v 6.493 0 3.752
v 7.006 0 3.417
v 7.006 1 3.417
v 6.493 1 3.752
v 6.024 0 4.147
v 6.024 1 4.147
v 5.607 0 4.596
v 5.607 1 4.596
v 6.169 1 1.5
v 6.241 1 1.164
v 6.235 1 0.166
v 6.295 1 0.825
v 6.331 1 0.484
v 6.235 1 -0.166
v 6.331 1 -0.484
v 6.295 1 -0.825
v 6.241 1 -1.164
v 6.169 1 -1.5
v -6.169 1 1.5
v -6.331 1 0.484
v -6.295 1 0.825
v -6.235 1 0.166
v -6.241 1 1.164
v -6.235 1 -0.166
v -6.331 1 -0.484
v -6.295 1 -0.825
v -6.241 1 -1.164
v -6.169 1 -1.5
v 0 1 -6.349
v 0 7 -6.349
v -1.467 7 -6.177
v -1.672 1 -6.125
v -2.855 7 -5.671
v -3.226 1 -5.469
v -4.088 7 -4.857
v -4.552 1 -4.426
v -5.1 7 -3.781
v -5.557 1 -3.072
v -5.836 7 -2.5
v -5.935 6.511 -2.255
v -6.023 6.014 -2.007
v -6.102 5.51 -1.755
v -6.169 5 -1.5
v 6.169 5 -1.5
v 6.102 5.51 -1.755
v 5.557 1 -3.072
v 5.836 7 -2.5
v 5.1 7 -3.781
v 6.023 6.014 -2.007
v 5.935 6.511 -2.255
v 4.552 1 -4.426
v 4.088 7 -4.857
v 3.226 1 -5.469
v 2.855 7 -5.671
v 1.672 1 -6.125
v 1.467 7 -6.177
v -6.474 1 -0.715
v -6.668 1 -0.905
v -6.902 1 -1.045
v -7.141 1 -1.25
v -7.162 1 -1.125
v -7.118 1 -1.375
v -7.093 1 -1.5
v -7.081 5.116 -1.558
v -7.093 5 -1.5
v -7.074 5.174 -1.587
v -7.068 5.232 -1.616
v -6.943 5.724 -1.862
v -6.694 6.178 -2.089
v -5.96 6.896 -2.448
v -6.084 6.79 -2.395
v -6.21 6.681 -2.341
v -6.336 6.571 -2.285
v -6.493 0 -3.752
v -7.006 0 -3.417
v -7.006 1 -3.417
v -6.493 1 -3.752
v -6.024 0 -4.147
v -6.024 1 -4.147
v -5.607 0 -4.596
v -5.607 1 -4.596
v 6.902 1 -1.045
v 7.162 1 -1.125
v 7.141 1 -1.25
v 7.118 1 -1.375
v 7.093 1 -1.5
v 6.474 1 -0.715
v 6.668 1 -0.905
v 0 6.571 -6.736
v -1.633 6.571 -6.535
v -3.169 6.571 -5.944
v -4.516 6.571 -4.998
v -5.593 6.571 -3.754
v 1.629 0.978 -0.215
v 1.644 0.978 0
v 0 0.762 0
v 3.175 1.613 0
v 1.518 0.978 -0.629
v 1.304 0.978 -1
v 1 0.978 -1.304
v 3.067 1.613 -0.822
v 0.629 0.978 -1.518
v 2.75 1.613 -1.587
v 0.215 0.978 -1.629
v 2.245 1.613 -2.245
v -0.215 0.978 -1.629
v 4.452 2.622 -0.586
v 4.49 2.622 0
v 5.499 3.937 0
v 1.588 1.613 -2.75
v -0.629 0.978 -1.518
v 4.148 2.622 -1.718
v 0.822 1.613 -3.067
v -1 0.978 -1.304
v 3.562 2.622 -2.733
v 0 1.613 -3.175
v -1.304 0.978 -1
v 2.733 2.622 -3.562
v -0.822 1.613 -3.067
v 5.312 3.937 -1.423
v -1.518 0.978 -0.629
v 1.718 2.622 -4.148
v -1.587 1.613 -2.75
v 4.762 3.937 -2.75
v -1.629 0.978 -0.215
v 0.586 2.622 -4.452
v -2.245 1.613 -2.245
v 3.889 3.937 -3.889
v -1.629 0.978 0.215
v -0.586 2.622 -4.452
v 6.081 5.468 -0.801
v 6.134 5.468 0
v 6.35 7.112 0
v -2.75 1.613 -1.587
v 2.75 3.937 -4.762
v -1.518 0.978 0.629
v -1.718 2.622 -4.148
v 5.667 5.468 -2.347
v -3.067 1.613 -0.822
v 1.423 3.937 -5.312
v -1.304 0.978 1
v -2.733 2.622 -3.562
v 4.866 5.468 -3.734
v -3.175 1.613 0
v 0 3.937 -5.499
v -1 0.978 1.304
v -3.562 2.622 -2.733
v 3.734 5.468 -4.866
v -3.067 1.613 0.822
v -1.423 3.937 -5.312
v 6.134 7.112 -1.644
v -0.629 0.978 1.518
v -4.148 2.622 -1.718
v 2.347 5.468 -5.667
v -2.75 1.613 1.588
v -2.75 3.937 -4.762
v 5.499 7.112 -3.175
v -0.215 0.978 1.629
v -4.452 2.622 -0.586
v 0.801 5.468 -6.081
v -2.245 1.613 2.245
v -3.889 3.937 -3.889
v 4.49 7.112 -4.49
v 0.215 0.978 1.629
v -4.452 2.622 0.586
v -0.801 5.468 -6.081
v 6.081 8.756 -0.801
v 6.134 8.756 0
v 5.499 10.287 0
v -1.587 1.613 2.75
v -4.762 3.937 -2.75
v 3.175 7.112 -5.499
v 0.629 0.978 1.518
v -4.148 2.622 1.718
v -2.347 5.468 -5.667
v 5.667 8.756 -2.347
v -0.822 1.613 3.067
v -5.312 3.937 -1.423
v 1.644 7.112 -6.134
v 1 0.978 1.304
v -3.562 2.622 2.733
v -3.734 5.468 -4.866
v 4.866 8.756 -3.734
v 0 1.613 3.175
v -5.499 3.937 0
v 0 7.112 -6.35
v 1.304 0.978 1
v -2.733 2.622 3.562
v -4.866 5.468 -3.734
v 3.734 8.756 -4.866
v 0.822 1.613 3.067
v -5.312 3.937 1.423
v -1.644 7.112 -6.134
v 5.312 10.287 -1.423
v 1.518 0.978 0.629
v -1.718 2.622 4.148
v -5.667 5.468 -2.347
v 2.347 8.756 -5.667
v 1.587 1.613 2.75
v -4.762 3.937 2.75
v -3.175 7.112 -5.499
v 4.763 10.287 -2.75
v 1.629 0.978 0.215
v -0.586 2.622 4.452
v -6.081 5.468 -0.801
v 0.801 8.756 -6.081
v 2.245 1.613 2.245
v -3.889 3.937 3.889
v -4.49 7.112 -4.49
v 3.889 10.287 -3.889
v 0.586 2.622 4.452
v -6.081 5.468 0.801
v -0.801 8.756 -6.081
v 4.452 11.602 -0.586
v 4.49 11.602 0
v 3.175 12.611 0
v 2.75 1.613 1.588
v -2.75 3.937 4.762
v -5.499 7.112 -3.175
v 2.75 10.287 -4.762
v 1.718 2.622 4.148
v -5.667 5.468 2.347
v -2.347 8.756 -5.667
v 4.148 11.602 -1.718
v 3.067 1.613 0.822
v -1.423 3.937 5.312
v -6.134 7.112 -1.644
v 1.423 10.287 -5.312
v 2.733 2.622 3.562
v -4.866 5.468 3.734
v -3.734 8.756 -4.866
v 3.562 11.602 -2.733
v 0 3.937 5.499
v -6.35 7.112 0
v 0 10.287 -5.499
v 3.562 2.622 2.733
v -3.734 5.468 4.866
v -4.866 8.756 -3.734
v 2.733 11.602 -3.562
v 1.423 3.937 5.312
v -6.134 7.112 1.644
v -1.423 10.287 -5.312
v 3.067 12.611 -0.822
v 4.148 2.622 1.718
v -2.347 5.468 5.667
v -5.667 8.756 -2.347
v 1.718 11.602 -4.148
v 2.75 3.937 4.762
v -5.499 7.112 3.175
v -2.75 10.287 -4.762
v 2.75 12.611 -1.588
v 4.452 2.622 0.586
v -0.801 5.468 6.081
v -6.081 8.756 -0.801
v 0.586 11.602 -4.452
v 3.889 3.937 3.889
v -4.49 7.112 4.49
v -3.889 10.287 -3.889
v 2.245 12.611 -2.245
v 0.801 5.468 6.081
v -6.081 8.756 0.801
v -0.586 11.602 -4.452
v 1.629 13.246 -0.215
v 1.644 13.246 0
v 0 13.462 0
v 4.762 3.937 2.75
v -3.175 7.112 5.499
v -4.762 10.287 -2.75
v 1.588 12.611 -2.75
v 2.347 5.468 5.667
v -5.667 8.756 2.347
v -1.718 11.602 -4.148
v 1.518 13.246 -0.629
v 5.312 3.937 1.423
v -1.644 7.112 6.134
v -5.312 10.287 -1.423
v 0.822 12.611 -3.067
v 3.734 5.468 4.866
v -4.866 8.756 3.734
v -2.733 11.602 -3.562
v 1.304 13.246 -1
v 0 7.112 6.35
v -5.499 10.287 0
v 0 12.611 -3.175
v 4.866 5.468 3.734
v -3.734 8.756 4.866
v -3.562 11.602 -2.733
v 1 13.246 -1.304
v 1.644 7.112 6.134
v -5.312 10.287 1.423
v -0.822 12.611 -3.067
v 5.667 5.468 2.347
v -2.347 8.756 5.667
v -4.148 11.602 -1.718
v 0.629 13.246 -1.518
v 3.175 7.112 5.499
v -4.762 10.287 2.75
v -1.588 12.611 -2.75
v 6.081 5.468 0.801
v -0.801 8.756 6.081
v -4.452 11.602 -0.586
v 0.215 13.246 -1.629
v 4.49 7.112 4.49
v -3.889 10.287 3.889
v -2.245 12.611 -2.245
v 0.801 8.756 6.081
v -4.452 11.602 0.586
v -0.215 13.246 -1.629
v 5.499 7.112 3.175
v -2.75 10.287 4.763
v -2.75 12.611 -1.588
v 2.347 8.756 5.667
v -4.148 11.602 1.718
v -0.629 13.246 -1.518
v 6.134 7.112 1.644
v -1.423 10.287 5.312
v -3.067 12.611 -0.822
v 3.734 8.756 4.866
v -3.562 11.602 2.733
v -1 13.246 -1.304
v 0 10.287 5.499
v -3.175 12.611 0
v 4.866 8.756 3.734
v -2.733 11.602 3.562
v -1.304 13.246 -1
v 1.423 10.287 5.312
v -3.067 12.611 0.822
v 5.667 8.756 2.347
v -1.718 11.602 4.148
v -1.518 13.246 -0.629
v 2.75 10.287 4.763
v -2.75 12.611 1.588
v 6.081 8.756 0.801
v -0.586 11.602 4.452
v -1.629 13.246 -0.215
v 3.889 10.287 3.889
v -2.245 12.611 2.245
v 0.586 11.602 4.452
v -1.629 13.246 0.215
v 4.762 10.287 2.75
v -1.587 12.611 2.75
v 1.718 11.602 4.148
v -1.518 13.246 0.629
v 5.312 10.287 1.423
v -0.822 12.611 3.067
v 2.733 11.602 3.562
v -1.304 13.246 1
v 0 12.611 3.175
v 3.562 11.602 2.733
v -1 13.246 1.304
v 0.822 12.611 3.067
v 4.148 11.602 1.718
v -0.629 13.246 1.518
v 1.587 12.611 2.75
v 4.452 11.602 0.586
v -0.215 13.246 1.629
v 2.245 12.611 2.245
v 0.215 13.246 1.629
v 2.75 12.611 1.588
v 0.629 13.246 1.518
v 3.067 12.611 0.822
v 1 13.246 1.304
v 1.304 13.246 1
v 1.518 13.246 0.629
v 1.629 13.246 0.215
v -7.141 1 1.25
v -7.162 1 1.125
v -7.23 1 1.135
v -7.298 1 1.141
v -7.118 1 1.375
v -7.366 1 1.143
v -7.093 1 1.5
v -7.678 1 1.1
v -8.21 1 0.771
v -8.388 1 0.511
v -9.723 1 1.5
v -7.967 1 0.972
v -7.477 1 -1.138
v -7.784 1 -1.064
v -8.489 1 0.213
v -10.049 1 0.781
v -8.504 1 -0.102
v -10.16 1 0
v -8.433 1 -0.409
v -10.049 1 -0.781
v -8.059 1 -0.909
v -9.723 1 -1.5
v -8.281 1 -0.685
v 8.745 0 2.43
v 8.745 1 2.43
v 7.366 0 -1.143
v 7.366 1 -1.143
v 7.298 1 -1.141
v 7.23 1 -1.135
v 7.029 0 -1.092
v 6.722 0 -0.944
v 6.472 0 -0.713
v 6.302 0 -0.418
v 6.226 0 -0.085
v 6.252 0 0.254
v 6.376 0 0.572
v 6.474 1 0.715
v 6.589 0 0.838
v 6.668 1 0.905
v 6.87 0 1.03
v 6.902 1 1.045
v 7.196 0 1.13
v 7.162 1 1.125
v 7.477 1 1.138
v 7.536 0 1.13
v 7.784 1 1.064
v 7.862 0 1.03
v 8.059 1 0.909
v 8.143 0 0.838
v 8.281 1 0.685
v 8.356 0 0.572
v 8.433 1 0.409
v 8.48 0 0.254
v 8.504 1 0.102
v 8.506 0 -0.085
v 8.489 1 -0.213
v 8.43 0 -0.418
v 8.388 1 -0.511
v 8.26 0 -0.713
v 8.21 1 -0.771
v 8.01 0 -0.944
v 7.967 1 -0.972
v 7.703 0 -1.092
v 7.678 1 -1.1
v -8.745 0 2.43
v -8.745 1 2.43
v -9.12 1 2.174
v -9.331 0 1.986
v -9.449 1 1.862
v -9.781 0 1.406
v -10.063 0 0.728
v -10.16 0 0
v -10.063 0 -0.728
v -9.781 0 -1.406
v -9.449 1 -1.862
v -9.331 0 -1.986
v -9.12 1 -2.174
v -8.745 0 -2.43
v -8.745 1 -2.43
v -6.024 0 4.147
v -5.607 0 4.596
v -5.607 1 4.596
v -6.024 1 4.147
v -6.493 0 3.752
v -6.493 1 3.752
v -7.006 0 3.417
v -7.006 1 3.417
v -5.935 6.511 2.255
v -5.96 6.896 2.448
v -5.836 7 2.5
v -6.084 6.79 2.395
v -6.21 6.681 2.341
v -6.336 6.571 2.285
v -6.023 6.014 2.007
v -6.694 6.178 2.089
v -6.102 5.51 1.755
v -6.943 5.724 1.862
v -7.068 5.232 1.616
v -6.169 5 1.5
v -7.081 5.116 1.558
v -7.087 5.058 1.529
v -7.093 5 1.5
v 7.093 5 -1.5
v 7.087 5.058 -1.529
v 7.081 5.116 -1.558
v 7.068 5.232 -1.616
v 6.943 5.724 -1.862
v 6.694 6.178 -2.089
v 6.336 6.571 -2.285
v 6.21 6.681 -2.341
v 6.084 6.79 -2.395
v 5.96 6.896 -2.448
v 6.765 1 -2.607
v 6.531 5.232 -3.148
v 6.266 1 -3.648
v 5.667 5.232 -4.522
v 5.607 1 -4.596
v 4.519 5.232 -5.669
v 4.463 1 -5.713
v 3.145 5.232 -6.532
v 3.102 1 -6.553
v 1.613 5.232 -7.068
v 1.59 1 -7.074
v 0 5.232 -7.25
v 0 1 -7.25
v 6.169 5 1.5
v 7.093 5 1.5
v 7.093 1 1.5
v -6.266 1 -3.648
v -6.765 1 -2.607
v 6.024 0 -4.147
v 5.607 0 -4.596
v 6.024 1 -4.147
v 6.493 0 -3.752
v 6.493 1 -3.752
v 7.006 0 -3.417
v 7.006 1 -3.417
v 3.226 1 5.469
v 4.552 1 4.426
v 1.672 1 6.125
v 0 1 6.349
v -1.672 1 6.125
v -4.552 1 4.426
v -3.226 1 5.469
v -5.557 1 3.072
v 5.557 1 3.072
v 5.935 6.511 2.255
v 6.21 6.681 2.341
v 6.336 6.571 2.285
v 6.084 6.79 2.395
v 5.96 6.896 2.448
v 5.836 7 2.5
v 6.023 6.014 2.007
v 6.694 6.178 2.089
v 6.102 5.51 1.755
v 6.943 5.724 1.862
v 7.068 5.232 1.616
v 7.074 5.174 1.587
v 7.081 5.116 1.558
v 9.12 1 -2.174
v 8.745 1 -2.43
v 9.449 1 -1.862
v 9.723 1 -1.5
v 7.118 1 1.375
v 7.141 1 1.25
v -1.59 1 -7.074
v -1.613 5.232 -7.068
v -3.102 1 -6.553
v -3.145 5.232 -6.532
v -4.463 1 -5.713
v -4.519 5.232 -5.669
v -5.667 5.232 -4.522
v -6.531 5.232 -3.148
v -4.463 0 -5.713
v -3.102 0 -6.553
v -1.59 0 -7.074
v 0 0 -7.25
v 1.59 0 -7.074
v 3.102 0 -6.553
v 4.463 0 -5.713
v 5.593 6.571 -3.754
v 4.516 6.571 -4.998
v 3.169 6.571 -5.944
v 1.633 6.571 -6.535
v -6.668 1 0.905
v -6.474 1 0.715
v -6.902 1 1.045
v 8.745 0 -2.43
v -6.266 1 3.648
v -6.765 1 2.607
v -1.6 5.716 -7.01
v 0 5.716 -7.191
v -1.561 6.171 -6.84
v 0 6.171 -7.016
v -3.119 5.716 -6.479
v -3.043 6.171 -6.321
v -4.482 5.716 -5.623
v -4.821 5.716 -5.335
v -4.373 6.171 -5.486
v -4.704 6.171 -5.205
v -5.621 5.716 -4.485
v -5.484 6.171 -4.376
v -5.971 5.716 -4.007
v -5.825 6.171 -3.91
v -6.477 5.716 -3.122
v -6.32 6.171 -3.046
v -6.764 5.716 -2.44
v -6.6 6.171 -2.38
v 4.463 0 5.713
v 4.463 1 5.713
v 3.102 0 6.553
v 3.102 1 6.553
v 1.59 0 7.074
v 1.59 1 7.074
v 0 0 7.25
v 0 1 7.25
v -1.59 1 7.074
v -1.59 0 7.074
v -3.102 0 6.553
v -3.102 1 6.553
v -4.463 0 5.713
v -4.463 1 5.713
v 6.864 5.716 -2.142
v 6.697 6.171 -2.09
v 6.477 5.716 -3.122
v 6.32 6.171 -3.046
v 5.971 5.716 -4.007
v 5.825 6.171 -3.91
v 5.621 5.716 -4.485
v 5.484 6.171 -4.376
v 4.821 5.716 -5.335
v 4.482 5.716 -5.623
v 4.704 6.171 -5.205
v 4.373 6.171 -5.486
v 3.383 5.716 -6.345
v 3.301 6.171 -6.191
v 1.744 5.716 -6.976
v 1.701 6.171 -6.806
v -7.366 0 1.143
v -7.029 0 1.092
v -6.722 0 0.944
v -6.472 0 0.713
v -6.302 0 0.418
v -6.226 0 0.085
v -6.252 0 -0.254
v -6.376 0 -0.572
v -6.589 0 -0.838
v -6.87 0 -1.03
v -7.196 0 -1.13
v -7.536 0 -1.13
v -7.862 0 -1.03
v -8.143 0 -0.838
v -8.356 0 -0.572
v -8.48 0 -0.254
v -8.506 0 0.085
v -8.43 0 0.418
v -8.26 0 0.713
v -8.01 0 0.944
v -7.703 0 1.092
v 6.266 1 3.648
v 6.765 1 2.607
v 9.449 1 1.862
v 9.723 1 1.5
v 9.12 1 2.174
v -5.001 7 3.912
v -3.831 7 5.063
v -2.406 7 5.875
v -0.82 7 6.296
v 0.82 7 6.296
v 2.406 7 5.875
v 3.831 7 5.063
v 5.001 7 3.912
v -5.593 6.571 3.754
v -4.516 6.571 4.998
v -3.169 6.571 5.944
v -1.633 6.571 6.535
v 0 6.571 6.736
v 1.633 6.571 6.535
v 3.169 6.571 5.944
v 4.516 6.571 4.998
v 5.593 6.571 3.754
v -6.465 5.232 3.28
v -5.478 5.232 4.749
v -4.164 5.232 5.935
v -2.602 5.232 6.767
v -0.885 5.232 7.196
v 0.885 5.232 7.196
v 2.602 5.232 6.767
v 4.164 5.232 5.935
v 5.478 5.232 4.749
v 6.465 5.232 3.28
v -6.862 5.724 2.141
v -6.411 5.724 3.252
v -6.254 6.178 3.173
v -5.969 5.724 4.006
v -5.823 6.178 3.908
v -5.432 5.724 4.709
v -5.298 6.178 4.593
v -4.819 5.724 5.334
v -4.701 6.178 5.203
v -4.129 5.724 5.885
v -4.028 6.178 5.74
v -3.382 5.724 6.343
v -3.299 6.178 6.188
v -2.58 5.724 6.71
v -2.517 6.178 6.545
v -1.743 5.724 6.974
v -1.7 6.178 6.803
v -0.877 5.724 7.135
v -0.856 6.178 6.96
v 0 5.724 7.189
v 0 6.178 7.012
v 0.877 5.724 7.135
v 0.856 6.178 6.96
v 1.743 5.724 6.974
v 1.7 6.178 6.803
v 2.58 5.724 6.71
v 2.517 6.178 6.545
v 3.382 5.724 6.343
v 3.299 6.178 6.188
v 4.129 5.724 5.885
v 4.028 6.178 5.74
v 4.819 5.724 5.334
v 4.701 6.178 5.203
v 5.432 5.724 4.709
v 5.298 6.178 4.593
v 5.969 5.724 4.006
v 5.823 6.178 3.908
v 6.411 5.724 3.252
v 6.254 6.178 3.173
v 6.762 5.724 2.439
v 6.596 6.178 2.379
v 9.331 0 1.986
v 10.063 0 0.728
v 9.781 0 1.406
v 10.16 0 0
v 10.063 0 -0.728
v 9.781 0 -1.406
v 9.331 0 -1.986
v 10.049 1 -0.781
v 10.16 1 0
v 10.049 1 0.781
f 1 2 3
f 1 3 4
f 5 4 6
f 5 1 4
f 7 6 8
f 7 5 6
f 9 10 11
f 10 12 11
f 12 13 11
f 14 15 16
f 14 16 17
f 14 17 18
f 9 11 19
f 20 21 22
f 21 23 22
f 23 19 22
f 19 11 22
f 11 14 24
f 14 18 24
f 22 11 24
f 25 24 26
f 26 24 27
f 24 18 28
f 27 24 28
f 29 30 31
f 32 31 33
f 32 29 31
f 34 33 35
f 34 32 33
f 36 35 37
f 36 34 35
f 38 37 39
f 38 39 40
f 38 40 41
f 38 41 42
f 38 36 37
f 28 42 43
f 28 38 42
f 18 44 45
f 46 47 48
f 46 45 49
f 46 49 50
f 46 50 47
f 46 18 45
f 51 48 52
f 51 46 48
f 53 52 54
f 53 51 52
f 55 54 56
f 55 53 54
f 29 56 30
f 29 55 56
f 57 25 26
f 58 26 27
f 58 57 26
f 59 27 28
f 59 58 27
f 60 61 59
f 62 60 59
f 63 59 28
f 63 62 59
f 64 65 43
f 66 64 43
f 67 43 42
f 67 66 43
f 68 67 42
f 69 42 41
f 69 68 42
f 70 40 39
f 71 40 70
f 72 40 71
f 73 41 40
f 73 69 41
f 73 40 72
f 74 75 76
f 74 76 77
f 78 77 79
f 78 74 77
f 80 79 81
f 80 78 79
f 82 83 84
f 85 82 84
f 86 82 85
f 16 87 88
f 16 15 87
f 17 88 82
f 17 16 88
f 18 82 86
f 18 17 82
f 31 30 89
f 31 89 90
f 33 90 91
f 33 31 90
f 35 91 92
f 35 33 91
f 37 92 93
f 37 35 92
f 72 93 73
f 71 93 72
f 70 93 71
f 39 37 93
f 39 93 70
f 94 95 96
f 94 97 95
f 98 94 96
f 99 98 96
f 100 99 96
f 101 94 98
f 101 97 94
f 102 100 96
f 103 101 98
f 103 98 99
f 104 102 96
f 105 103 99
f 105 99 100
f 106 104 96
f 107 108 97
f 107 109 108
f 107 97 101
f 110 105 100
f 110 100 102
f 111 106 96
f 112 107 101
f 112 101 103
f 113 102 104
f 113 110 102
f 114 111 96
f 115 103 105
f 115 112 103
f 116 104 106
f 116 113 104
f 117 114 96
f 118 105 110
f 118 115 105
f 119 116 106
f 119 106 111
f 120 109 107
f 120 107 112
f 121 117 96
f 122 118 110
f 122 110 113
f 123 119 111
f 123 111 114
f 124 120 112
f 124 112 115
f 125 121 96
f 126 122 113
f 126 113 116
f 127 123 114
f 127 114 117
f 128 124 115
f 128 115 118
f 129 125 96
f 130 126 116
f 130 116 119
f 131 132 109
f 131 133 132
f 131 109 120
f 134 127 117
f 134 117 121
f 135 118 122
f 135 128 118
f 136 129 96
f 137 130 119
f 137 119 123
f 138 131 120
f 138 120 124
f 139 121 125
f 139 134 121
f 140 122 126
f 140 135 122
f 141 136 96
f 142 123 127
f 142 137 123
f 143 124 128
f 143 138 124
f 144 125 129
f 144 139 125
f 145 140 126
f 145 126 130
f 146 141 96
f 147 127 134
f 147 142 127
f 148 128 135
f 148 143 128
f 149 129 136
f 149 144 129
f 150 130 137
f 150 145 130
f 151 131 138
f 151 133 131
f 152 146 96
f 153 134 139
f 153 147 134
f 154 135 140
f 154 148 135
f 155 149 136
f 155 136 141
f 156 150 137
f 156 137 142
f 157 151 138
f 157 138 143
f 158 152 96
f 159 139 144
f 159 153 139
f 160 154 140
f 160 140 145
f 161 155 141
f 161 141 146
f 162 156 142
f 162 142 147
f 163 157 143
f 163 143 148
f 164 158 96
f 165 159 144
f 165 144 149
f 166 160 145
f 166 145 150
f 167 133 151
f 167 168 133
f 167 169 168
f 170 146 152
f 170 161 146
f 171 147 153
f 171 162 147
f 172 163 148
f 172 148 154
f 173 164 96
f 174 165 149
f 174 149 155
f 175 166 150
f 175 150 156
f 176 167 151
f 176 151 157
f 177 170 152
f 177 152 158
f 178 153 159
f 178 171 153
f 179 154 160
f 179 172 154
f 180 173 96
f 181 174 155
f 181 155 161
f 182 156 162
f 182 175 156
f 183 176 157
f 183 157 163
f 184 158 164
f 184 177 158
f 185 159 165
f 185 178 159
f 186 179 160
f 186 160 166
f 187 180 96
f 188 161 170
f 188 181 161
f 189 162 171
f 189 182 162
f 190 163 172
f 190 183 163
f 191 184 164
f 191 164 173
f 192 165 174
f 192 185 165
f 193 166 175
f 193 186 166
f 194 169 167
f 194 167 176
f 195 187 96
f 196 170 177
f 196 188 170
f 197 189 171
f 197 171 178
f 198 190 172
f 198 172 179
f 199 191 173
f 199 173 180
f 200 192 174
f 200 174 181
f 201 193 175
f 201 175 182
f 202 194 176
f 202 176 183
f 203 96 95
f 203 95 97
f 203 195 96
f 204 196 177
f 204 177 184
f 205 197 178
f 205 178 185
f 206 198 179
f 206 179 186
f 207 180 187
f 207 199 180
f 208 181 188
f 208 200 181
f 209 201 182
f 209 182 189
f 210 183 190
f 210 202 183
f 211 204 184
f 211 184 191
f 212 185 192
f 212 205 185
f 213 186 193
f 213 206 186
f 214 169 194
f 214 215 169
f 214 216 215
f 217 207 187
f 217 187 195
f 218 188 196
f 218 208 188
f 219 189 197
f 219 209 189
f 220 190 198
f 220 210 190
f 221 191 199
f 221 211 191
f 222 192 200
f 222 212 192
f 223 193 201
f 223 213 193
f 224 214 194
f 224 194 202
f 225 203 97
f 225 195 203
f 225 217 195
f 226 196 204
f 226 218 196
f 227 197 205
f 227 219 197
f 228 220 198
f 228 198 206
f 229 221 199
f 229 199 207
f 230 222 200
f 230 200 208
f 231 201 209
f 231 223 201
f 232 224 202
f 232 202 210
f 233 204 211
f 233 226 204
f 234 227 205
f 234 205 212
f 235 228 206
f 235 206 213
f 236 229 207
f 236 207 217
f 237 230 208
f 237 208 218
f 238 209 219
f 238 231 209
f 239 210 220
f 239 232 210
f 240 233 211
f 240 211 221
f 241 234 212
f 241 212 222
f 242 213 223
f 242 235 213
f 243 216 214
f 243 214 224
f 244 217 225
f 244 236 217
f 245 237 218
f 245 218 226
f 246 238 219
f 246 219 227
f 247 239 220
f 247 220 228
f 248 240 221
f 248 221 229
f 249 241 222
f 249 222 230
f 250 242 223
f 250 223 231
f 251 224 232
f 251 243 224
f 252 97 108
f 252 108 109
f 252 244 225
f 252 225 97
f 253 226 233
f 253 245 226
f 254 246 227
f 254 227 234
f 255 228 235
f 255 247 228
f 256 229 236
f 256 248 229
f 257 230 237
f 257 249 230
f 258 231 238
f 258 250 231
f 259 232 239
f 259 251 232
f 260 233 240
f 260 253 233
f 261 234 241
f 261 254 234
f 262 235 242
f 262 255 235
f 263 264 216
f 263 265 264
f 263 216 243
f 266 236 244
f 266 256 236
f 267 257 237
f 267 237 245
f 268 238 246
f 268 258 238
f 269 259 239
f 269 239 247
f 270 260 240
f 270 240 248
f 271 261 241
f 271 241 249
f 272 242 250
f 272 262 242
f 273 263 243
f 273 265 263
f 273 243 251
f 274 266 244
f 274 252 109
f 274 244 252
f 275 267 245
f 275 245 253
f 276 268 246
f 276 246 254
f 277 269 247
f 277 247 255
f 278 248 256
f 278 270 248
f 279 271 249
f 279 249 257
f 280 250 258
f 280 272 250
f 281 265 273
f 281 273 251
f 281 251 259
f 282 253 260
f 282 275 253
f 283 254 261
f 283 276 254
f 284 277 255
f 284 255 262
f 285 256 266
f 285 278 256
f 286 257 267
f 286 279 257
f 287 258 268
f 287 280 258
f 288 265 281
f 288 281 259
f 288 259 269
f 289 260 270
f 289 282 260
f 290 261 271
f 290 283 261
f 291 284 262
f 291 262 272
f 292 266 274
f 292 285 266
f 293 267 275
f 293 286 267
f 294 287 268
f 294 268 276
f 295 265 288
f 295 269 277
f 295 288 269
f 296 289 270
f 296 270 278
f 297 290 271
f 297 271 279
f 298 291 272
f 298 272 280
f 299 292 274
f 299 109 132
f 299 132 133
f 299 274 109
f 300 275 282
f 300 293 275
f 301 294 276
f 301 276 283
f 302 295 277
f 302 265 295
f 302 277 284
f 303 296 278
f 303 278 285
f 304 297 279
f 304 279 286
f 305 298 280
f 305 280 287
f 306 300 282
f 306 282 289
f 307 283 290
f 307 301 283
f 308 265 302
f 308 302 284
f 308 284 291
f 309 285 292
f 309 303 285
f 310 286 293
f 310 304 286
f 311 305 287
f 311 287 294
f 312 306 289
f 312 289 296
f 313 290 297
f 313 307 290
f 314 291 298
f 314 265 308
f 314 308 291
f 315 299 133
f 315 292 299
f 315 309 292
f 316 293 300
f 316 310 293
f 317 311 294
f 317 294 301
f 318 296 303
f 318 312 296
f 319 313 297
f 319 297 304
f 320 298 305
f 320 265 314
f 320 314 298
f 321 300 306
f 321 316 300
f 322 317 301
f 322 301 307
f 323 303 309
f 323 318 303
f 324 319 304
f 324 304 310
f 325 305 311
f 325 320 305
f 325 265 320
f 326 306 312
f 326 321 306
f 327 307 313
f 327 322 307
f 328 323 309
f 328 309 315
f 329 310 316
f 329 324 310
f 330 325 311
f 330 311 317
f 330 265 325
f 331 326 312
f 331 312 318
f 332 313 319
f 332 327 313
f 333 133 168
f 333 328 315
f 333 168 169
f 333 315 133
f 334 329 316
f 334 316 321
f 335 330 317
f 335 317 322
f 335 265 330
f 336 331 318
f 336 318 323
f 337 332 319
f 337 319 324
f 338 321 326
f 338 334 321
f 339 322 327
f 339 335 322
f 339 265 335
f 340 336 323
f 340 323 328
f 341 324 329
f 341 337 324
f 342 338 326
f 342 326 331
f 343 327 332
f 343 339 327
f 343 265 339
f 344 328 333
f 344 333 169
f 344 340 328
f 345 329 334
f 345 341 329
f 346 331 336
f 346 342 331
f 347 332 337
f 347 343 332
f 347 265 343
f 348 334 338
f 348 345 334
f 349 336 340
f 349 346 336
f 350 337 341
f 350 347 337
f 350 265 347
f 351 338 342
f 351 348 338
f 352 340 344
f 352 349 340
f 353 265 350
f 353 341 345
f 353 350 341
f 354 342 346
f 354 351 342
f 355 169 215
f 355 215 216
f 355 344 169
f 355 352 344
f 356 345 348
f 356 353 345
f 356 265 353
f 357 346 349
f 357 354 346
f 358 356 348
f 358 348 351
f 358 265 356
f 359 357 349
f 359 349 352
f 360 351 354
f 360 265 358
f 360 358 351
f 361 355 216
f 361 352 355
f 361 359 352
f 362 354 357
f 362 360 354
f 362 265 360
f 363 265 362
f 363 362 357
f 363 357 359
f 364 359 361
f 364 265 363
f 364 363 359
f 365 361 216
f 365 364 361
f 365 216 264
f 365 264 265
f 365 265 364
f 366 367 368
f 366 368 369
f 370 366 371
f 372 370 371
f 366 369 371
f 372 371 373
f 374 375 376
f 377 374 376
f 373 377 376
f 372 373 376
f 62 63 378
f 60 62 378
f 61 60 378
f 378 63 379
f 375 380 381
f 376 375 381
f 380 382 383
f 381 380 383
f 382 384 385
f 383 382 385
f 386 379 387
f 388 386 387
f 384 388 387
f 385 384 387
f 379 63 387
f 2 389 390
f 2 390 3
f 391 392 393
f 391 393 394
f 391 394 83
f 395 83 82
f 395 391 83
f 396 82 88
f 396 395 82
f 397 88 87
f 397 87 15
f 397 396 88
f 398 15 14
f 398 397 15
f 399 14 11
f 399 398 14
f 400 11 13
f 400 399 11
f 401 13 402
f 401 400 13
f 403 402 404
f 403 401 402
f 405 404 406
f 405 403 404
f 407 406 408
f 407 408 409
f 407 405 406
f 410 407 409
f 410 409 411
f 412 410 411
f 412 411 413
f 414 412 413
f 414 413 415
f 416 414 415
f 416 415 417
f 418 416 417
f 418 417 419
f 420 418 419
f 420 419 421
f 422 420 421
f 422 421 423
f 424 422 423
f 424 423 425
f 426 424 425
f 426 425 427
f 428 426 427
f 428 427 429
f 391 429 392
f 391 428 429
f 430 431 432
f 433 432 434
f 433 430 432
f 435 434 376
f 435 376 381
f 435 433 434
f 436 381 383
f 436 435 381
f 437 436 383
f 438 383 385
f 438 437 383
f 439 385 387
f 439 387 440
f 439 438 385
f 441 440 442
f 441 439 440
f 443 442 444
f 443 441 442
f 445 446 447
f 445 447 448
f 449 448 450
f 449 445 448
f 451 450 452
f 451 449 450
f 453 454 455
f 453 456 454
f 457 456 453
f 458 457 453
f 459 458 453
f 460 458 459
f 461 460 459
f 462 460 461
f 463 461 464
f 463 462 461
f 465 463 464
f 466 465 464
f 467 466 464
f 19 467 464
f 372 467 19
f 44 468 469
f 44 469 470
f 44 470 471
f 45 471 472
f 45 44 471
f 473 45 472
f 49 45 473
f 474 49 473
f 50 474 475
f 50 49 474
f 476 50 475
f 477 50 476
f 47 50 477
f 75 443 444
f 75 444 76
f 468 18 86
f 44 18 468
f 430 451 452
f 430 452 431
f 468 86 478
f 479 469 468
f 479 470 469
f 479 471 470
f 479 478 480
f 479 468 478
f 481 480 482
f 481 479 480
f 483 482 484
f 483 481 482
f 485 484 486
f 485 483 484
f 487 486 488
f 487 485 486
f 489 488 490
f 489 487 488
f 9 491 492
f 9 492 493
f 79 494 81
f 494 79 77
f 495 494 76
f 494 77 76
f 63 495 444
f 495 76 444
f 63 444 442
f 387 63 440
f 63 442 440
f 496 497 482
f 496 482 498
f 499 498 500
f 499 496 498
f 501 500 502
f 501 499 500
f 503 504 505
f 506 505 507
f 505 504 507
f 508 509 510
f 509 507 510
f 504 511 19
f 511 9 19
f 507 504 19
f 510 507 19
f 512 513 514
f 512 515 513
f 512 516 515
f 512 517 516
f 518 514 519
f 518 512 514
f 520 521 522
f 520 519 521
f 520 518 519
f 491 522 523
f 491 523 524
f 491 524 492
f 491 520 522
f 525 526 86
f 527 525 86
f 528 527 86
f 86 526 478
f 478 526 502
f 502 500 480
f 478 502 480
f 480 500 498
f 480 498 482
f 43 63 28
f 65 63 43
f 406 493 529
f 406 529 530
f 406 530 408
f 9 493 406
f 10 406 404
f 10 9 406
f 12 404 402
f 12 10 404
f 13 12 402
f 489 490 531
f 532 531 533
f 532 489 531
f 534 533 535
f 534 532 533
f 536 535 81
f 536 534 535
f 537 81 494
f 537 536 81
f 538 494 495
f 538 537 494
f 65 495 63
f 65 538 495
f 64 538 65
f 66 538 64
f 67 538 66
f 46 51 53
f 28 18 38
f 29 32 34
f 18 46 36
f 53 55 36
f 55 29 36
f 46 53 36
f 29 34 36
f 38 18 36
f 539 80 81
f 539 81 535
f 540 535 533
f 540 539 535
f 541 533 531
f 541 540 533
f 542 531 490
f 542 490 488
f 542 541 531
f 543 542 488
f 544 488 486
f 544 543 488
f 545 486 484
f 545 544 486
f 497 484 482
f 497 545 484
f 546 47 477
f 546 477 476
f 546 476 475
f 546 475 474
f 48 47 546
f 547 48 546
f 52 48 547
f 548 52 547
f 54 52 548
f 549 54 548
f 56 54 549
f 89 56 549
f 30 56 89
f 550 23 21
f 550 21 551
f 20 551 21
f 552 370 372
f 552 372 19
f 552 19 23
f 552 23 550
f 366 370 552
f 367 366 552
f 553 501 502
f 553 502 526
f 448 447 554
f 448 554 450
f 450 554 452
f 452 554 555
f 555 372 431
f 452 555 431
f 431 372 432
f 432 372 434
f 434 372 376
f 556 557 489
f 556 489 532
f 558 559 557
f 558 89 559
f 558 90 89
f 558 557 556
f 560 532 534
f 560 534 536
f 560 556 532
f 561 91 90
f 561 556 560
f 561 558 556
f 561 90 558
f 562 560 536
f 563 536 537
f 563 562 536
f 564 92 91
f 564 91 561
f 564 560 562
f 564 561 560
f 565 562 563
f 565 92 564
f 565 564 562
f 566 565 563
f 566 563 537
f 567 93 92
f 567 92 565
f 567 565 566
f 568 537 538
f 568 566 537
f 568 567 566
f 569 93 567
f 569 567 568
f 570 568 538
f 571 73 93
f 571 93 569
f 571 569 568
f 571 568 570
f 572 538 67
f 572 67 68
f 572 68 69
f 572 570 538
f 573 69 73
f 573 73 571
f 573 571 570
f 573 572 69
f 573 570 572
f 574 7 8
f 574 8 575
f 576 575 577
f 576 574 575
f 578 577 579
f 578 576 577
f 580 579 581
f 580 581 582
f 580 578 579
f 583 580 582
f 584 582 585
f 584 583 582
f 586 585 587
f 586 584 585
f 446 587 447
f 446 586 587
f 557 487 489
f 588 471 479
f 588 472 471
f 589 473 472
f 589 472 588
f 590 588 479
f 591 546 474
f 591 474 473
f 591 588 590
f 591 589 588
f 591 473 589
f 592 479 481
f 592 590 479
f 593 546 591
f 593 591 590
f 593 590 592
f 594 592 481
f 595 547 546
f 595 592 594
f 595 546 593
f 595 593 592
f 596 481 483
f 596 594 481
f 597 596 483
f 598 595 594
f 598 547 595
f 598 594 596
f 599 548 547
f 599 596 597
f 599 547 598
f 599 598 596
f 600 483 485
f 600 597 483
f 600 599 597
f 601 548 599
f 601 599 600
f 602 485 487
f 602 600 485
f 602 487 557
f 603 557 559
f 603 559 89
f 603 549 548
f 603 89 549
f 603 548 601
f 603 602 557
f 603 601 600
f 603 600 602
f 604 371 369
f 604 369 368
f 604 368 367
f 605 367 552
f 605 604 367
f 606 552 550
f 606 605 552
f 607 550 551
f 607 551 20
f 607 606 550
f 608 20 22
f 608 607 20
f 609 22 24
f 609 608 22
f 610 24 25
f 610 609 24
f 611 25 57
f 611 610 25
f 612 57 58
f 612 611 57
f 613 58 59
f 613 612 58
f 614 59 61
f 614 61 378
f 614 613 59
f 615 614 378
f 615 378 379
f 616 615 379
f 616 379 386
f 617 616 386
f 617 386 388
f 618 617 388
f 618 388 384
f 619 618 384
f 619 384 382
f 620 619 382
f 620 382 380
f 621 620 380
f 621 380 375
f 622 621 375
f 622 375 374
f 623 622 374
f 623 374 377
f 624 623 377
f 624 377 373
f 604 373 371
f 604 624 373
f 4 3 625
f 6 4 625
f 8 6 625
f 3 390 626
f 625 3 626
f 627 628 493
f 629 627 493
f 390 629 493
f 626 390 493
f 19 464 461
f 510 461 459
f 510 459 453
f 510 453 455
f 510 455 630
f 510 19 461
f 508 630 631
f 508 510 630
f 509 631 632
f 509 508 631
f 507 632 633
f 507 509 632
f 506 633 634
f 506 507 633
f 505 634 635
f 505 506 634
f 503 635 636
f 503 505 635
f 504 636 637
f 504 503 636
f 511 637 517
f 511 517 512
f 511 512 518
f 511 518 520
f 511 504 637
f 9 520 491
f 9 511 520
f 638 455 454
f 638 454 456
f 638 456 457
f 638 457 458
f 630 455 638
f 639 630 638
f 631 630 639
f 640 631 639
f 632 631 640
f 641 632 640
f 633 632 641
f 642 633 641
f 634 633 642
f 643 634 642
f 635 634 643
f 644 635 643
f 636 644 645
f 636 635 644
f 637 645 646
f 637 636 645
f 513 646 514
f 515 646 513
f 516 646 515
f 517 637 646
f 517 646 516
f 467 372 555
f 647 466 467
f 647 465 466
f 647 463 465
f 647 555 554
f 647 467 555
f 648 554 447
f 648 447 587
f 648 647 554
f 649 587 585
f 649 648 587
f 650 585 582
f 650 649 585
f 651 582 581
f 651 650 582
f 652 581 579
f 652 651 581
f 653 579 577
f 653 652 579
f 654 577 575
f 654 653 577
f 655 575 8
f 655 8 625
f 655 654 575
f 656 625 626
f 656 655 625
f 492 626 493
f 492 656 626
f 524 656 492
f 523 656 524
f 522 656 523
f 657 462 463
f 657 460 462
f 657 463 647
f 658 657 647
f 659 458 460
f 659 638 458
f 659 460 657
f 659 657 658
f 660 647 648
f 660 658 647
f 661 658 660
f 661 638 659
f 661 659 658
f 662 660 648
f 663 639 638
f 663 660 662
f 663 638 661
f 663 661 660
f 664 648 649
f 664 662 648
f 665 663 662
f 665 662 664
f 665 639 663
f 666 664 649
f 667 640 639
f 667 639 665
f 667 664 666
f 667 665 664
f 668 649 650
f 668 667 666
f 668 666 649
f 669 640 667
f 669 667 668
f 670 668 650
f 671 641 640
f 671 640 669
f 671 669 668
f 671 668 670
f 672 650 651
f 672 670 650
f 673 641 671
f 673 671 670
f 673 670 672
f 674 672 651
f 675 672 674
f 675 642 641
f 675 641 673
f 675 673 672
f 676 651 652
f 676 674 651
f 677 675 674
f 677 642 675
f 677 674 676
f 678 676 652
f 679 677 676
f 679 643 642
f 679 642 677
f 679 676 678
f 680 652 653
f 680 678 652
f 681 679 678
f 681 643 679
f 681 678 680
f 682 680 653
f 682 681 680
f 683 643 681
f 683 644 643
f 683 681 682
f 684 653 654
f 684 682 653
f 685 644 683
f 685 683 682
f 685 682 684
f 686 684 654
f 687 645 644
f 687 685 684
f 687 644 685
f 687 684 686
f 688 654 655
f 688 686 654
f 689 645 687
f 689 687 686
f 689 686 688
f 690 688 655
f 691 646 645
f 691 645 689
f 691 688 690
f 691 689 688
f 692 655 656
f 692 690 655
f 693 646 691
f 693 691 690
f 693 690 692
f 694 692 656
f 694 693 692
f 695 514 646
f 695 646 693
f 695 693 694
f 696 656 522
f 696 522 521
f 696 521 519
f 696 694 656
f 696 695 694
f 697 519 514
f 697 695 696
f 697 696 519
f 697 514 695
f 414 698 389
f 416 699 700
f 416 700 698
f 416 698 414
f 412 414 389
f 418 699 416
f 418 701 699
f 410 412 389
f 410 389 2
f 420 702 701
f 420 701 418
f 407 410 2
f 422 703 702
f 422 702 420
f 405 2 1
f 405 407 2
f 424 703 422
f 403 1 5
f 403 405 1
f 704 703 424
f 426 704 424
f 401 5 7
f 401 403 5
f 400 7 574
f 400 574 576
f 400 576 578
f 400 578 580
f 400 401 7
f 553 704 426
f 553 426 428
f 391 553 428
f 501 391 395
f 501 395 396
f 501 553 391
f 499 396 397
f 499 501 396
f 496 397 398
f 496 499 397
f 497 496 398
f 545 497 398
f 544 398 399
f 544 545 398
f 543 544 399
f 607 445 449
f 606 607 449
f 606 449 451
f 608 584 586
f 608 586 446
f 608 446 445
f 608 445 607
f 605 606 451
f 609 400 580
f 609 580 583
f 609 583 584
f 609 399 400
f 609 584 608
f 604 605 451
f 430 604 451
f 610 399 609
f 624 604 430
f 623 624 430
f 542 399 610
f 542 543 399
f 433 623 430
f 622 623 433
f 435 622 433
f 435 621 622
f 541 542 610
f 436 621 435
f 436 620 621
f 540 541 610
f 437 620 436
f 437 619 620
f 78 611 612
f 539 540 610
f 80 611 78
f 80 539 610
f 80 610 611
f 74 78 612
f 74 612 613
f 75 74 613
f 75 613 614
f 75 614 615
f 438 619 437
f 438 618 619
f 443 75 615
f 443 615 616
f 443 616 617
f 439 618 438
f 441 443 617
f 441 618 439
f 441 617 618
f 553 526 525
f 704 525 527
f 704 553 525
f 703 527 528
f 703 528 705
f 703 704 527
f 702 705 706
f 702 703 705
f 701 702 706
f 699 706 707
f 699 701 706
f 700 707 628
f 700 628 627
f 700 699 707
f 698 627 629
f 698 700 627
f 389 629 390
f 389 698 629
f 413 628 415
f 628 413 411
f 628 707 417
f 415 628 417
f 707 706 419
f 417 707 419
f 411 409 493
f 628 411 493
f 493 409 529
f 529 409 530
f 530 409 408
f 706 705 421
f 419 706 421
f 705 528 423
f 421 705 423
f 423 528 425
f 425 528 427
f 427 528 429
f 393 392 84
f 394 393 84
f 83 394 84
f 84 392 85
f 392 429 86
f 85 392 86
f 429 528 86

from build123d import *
from build123d.topology import SkipClean

# Parameters (mm, degrees)
SKICA1_R                      = 1.143
P_IDAT_VYSUNUT_M1_DEPTH       = 1
ODEBRAT_VYSUNUT_M1_DEPTH      = 19.357928681
ODEBRAT_VYSUNUT_M1_DEPTH_BACK = 19.357928681


with BuildPart() as part:
    # Skica1 → Přidat vysunutím1 (new body)
    with BuildSketch(Plane(origin=(0, 0, 0), x_dir=(1, 0, 0), z_dir=(0, 1, 0))):
        with BuildLine():
            Line((-8.745264485, 2.429828282), (-7.005945743, 3.417132853))
            ThreePointArc((-7.005945743, 3.417132853), (-6.252202895, 3.941990357), (-5.607183834, 4.595866561))
            ThreePointArc((-5.607183834, 4.595866561), (0, 7.25), (5.607183834, 4.595866561))
            ThreePointArc((5.607183834, 4.595866561), (6.252202895, 3.941990357), (7.005945743, 3.417132853))
            Line((7.005945743, 3.417132853), (8.745264485, 2.429828282))
            ThreePointArc((8.745264485, 2.429828282), (10.16, 0), (8.745264485, -2.429828282))
            Line((8.745264485, -2.429828282), (7.005945743, -3.417132853))
            ThreePointArc((7.005945743, -3.417132853), (6.252202895, -3.941990357), (5.607183834, -4.595866561))
            ThreePointArc((5.607183834, -4.595866561), (0, -7.25), (-5.607183834, -4.595866561))
            ThreePointArc((-5.607183834, -4.595866561), (-6.252202895, -3.941990357), (-7.005945743, -3.417132853))
            Line((-7.005945743, -3.417132853), (-8.745264485, -2.429828282))
            ThreePointArc((-8.745264485, -2.429828282), (-10.16, 0), (-8.745264485, 2.429828282))
        make_face()
        with Locations(Location((-7.366, 0, 0), (0, 0, 270))):
            Circle(SKICA1_R, mode=Mode.SUBTRACT)
        with Locations(Location((7.366, 0, 0), (0, 0, 90))):
            Circle(SKICA1_R, mode=Mode.SUBTRACT)
    extrude(amount=P_IDAT_VYSUNUT_M1_DEPTH)

    # Skica3 → Rotovat5 (revolve)
    with SkipClean():  # the faces are left unmerged after this step: merging them gives an invalid solid
        with BuildSketch(Plane(origin=(0, 0, 0), x_dir=(0, 0, -1), z_dir=(1, 0, 0))):
            with BuildLine():
                Line((7.25, 1), (7.25, 5.231902127))
                ThreePointArc((7.25, 5.231902127), (7.11704533, 5.9489389), (6.735858265, 6.570642287))
                Line((6.735858265, 6.570642287), (6.349012207, 7))
                Line((6.349012207, 7), (6.349012207, 1))
                Line((6.349012207, 1), (7.25, 1))
            make_face()
        revolve(axis=Axis((0, 0, 0), (0, 1, 0)))

    # Skica4 → Odebrat vysunutím1 (cut, two sides: drawn at the far end of the back side and taken through both)
    with SkipClean():  # the faces are left unmerged after this step: merging them gives an invalid solid
        with BuildSketch(Plane(origin=(0, 0, 0), x_dir=(0, 0, -1), z_dir=(1, 0, 0)).offset(-ODEBRAT_VYSUNUT_M1_DEPTH_BACK)):
            Polygon((-2.5, 7), (-1.5, 5), (-1.5, 1), (1.5, 1), (1.5, 5), (2.5, 7), align=None)
        extrude(amount=ODEBRAT_VYSUNUT_M1_DEPTH + ODEBRAT_VYSUNUT_M1_DEPTH_BACK, mode=Mode.SUBTRACT)


with BuildPart() as body_2:
    # Skica2 → Rotovat2 (revolve)
    with BuildSketch(Plane.XY):
        with BuildLine():
            Line((0, 13.462), (0, 0.762))
            ThreePointArc((0, 0.762), (6.35, 7.112), (0, 13.462))
        make_face()
    revolve(axis=Axis((0, 0, 0), (0, 1, 0)))


solid = Compound([part.part, body_2.part])
